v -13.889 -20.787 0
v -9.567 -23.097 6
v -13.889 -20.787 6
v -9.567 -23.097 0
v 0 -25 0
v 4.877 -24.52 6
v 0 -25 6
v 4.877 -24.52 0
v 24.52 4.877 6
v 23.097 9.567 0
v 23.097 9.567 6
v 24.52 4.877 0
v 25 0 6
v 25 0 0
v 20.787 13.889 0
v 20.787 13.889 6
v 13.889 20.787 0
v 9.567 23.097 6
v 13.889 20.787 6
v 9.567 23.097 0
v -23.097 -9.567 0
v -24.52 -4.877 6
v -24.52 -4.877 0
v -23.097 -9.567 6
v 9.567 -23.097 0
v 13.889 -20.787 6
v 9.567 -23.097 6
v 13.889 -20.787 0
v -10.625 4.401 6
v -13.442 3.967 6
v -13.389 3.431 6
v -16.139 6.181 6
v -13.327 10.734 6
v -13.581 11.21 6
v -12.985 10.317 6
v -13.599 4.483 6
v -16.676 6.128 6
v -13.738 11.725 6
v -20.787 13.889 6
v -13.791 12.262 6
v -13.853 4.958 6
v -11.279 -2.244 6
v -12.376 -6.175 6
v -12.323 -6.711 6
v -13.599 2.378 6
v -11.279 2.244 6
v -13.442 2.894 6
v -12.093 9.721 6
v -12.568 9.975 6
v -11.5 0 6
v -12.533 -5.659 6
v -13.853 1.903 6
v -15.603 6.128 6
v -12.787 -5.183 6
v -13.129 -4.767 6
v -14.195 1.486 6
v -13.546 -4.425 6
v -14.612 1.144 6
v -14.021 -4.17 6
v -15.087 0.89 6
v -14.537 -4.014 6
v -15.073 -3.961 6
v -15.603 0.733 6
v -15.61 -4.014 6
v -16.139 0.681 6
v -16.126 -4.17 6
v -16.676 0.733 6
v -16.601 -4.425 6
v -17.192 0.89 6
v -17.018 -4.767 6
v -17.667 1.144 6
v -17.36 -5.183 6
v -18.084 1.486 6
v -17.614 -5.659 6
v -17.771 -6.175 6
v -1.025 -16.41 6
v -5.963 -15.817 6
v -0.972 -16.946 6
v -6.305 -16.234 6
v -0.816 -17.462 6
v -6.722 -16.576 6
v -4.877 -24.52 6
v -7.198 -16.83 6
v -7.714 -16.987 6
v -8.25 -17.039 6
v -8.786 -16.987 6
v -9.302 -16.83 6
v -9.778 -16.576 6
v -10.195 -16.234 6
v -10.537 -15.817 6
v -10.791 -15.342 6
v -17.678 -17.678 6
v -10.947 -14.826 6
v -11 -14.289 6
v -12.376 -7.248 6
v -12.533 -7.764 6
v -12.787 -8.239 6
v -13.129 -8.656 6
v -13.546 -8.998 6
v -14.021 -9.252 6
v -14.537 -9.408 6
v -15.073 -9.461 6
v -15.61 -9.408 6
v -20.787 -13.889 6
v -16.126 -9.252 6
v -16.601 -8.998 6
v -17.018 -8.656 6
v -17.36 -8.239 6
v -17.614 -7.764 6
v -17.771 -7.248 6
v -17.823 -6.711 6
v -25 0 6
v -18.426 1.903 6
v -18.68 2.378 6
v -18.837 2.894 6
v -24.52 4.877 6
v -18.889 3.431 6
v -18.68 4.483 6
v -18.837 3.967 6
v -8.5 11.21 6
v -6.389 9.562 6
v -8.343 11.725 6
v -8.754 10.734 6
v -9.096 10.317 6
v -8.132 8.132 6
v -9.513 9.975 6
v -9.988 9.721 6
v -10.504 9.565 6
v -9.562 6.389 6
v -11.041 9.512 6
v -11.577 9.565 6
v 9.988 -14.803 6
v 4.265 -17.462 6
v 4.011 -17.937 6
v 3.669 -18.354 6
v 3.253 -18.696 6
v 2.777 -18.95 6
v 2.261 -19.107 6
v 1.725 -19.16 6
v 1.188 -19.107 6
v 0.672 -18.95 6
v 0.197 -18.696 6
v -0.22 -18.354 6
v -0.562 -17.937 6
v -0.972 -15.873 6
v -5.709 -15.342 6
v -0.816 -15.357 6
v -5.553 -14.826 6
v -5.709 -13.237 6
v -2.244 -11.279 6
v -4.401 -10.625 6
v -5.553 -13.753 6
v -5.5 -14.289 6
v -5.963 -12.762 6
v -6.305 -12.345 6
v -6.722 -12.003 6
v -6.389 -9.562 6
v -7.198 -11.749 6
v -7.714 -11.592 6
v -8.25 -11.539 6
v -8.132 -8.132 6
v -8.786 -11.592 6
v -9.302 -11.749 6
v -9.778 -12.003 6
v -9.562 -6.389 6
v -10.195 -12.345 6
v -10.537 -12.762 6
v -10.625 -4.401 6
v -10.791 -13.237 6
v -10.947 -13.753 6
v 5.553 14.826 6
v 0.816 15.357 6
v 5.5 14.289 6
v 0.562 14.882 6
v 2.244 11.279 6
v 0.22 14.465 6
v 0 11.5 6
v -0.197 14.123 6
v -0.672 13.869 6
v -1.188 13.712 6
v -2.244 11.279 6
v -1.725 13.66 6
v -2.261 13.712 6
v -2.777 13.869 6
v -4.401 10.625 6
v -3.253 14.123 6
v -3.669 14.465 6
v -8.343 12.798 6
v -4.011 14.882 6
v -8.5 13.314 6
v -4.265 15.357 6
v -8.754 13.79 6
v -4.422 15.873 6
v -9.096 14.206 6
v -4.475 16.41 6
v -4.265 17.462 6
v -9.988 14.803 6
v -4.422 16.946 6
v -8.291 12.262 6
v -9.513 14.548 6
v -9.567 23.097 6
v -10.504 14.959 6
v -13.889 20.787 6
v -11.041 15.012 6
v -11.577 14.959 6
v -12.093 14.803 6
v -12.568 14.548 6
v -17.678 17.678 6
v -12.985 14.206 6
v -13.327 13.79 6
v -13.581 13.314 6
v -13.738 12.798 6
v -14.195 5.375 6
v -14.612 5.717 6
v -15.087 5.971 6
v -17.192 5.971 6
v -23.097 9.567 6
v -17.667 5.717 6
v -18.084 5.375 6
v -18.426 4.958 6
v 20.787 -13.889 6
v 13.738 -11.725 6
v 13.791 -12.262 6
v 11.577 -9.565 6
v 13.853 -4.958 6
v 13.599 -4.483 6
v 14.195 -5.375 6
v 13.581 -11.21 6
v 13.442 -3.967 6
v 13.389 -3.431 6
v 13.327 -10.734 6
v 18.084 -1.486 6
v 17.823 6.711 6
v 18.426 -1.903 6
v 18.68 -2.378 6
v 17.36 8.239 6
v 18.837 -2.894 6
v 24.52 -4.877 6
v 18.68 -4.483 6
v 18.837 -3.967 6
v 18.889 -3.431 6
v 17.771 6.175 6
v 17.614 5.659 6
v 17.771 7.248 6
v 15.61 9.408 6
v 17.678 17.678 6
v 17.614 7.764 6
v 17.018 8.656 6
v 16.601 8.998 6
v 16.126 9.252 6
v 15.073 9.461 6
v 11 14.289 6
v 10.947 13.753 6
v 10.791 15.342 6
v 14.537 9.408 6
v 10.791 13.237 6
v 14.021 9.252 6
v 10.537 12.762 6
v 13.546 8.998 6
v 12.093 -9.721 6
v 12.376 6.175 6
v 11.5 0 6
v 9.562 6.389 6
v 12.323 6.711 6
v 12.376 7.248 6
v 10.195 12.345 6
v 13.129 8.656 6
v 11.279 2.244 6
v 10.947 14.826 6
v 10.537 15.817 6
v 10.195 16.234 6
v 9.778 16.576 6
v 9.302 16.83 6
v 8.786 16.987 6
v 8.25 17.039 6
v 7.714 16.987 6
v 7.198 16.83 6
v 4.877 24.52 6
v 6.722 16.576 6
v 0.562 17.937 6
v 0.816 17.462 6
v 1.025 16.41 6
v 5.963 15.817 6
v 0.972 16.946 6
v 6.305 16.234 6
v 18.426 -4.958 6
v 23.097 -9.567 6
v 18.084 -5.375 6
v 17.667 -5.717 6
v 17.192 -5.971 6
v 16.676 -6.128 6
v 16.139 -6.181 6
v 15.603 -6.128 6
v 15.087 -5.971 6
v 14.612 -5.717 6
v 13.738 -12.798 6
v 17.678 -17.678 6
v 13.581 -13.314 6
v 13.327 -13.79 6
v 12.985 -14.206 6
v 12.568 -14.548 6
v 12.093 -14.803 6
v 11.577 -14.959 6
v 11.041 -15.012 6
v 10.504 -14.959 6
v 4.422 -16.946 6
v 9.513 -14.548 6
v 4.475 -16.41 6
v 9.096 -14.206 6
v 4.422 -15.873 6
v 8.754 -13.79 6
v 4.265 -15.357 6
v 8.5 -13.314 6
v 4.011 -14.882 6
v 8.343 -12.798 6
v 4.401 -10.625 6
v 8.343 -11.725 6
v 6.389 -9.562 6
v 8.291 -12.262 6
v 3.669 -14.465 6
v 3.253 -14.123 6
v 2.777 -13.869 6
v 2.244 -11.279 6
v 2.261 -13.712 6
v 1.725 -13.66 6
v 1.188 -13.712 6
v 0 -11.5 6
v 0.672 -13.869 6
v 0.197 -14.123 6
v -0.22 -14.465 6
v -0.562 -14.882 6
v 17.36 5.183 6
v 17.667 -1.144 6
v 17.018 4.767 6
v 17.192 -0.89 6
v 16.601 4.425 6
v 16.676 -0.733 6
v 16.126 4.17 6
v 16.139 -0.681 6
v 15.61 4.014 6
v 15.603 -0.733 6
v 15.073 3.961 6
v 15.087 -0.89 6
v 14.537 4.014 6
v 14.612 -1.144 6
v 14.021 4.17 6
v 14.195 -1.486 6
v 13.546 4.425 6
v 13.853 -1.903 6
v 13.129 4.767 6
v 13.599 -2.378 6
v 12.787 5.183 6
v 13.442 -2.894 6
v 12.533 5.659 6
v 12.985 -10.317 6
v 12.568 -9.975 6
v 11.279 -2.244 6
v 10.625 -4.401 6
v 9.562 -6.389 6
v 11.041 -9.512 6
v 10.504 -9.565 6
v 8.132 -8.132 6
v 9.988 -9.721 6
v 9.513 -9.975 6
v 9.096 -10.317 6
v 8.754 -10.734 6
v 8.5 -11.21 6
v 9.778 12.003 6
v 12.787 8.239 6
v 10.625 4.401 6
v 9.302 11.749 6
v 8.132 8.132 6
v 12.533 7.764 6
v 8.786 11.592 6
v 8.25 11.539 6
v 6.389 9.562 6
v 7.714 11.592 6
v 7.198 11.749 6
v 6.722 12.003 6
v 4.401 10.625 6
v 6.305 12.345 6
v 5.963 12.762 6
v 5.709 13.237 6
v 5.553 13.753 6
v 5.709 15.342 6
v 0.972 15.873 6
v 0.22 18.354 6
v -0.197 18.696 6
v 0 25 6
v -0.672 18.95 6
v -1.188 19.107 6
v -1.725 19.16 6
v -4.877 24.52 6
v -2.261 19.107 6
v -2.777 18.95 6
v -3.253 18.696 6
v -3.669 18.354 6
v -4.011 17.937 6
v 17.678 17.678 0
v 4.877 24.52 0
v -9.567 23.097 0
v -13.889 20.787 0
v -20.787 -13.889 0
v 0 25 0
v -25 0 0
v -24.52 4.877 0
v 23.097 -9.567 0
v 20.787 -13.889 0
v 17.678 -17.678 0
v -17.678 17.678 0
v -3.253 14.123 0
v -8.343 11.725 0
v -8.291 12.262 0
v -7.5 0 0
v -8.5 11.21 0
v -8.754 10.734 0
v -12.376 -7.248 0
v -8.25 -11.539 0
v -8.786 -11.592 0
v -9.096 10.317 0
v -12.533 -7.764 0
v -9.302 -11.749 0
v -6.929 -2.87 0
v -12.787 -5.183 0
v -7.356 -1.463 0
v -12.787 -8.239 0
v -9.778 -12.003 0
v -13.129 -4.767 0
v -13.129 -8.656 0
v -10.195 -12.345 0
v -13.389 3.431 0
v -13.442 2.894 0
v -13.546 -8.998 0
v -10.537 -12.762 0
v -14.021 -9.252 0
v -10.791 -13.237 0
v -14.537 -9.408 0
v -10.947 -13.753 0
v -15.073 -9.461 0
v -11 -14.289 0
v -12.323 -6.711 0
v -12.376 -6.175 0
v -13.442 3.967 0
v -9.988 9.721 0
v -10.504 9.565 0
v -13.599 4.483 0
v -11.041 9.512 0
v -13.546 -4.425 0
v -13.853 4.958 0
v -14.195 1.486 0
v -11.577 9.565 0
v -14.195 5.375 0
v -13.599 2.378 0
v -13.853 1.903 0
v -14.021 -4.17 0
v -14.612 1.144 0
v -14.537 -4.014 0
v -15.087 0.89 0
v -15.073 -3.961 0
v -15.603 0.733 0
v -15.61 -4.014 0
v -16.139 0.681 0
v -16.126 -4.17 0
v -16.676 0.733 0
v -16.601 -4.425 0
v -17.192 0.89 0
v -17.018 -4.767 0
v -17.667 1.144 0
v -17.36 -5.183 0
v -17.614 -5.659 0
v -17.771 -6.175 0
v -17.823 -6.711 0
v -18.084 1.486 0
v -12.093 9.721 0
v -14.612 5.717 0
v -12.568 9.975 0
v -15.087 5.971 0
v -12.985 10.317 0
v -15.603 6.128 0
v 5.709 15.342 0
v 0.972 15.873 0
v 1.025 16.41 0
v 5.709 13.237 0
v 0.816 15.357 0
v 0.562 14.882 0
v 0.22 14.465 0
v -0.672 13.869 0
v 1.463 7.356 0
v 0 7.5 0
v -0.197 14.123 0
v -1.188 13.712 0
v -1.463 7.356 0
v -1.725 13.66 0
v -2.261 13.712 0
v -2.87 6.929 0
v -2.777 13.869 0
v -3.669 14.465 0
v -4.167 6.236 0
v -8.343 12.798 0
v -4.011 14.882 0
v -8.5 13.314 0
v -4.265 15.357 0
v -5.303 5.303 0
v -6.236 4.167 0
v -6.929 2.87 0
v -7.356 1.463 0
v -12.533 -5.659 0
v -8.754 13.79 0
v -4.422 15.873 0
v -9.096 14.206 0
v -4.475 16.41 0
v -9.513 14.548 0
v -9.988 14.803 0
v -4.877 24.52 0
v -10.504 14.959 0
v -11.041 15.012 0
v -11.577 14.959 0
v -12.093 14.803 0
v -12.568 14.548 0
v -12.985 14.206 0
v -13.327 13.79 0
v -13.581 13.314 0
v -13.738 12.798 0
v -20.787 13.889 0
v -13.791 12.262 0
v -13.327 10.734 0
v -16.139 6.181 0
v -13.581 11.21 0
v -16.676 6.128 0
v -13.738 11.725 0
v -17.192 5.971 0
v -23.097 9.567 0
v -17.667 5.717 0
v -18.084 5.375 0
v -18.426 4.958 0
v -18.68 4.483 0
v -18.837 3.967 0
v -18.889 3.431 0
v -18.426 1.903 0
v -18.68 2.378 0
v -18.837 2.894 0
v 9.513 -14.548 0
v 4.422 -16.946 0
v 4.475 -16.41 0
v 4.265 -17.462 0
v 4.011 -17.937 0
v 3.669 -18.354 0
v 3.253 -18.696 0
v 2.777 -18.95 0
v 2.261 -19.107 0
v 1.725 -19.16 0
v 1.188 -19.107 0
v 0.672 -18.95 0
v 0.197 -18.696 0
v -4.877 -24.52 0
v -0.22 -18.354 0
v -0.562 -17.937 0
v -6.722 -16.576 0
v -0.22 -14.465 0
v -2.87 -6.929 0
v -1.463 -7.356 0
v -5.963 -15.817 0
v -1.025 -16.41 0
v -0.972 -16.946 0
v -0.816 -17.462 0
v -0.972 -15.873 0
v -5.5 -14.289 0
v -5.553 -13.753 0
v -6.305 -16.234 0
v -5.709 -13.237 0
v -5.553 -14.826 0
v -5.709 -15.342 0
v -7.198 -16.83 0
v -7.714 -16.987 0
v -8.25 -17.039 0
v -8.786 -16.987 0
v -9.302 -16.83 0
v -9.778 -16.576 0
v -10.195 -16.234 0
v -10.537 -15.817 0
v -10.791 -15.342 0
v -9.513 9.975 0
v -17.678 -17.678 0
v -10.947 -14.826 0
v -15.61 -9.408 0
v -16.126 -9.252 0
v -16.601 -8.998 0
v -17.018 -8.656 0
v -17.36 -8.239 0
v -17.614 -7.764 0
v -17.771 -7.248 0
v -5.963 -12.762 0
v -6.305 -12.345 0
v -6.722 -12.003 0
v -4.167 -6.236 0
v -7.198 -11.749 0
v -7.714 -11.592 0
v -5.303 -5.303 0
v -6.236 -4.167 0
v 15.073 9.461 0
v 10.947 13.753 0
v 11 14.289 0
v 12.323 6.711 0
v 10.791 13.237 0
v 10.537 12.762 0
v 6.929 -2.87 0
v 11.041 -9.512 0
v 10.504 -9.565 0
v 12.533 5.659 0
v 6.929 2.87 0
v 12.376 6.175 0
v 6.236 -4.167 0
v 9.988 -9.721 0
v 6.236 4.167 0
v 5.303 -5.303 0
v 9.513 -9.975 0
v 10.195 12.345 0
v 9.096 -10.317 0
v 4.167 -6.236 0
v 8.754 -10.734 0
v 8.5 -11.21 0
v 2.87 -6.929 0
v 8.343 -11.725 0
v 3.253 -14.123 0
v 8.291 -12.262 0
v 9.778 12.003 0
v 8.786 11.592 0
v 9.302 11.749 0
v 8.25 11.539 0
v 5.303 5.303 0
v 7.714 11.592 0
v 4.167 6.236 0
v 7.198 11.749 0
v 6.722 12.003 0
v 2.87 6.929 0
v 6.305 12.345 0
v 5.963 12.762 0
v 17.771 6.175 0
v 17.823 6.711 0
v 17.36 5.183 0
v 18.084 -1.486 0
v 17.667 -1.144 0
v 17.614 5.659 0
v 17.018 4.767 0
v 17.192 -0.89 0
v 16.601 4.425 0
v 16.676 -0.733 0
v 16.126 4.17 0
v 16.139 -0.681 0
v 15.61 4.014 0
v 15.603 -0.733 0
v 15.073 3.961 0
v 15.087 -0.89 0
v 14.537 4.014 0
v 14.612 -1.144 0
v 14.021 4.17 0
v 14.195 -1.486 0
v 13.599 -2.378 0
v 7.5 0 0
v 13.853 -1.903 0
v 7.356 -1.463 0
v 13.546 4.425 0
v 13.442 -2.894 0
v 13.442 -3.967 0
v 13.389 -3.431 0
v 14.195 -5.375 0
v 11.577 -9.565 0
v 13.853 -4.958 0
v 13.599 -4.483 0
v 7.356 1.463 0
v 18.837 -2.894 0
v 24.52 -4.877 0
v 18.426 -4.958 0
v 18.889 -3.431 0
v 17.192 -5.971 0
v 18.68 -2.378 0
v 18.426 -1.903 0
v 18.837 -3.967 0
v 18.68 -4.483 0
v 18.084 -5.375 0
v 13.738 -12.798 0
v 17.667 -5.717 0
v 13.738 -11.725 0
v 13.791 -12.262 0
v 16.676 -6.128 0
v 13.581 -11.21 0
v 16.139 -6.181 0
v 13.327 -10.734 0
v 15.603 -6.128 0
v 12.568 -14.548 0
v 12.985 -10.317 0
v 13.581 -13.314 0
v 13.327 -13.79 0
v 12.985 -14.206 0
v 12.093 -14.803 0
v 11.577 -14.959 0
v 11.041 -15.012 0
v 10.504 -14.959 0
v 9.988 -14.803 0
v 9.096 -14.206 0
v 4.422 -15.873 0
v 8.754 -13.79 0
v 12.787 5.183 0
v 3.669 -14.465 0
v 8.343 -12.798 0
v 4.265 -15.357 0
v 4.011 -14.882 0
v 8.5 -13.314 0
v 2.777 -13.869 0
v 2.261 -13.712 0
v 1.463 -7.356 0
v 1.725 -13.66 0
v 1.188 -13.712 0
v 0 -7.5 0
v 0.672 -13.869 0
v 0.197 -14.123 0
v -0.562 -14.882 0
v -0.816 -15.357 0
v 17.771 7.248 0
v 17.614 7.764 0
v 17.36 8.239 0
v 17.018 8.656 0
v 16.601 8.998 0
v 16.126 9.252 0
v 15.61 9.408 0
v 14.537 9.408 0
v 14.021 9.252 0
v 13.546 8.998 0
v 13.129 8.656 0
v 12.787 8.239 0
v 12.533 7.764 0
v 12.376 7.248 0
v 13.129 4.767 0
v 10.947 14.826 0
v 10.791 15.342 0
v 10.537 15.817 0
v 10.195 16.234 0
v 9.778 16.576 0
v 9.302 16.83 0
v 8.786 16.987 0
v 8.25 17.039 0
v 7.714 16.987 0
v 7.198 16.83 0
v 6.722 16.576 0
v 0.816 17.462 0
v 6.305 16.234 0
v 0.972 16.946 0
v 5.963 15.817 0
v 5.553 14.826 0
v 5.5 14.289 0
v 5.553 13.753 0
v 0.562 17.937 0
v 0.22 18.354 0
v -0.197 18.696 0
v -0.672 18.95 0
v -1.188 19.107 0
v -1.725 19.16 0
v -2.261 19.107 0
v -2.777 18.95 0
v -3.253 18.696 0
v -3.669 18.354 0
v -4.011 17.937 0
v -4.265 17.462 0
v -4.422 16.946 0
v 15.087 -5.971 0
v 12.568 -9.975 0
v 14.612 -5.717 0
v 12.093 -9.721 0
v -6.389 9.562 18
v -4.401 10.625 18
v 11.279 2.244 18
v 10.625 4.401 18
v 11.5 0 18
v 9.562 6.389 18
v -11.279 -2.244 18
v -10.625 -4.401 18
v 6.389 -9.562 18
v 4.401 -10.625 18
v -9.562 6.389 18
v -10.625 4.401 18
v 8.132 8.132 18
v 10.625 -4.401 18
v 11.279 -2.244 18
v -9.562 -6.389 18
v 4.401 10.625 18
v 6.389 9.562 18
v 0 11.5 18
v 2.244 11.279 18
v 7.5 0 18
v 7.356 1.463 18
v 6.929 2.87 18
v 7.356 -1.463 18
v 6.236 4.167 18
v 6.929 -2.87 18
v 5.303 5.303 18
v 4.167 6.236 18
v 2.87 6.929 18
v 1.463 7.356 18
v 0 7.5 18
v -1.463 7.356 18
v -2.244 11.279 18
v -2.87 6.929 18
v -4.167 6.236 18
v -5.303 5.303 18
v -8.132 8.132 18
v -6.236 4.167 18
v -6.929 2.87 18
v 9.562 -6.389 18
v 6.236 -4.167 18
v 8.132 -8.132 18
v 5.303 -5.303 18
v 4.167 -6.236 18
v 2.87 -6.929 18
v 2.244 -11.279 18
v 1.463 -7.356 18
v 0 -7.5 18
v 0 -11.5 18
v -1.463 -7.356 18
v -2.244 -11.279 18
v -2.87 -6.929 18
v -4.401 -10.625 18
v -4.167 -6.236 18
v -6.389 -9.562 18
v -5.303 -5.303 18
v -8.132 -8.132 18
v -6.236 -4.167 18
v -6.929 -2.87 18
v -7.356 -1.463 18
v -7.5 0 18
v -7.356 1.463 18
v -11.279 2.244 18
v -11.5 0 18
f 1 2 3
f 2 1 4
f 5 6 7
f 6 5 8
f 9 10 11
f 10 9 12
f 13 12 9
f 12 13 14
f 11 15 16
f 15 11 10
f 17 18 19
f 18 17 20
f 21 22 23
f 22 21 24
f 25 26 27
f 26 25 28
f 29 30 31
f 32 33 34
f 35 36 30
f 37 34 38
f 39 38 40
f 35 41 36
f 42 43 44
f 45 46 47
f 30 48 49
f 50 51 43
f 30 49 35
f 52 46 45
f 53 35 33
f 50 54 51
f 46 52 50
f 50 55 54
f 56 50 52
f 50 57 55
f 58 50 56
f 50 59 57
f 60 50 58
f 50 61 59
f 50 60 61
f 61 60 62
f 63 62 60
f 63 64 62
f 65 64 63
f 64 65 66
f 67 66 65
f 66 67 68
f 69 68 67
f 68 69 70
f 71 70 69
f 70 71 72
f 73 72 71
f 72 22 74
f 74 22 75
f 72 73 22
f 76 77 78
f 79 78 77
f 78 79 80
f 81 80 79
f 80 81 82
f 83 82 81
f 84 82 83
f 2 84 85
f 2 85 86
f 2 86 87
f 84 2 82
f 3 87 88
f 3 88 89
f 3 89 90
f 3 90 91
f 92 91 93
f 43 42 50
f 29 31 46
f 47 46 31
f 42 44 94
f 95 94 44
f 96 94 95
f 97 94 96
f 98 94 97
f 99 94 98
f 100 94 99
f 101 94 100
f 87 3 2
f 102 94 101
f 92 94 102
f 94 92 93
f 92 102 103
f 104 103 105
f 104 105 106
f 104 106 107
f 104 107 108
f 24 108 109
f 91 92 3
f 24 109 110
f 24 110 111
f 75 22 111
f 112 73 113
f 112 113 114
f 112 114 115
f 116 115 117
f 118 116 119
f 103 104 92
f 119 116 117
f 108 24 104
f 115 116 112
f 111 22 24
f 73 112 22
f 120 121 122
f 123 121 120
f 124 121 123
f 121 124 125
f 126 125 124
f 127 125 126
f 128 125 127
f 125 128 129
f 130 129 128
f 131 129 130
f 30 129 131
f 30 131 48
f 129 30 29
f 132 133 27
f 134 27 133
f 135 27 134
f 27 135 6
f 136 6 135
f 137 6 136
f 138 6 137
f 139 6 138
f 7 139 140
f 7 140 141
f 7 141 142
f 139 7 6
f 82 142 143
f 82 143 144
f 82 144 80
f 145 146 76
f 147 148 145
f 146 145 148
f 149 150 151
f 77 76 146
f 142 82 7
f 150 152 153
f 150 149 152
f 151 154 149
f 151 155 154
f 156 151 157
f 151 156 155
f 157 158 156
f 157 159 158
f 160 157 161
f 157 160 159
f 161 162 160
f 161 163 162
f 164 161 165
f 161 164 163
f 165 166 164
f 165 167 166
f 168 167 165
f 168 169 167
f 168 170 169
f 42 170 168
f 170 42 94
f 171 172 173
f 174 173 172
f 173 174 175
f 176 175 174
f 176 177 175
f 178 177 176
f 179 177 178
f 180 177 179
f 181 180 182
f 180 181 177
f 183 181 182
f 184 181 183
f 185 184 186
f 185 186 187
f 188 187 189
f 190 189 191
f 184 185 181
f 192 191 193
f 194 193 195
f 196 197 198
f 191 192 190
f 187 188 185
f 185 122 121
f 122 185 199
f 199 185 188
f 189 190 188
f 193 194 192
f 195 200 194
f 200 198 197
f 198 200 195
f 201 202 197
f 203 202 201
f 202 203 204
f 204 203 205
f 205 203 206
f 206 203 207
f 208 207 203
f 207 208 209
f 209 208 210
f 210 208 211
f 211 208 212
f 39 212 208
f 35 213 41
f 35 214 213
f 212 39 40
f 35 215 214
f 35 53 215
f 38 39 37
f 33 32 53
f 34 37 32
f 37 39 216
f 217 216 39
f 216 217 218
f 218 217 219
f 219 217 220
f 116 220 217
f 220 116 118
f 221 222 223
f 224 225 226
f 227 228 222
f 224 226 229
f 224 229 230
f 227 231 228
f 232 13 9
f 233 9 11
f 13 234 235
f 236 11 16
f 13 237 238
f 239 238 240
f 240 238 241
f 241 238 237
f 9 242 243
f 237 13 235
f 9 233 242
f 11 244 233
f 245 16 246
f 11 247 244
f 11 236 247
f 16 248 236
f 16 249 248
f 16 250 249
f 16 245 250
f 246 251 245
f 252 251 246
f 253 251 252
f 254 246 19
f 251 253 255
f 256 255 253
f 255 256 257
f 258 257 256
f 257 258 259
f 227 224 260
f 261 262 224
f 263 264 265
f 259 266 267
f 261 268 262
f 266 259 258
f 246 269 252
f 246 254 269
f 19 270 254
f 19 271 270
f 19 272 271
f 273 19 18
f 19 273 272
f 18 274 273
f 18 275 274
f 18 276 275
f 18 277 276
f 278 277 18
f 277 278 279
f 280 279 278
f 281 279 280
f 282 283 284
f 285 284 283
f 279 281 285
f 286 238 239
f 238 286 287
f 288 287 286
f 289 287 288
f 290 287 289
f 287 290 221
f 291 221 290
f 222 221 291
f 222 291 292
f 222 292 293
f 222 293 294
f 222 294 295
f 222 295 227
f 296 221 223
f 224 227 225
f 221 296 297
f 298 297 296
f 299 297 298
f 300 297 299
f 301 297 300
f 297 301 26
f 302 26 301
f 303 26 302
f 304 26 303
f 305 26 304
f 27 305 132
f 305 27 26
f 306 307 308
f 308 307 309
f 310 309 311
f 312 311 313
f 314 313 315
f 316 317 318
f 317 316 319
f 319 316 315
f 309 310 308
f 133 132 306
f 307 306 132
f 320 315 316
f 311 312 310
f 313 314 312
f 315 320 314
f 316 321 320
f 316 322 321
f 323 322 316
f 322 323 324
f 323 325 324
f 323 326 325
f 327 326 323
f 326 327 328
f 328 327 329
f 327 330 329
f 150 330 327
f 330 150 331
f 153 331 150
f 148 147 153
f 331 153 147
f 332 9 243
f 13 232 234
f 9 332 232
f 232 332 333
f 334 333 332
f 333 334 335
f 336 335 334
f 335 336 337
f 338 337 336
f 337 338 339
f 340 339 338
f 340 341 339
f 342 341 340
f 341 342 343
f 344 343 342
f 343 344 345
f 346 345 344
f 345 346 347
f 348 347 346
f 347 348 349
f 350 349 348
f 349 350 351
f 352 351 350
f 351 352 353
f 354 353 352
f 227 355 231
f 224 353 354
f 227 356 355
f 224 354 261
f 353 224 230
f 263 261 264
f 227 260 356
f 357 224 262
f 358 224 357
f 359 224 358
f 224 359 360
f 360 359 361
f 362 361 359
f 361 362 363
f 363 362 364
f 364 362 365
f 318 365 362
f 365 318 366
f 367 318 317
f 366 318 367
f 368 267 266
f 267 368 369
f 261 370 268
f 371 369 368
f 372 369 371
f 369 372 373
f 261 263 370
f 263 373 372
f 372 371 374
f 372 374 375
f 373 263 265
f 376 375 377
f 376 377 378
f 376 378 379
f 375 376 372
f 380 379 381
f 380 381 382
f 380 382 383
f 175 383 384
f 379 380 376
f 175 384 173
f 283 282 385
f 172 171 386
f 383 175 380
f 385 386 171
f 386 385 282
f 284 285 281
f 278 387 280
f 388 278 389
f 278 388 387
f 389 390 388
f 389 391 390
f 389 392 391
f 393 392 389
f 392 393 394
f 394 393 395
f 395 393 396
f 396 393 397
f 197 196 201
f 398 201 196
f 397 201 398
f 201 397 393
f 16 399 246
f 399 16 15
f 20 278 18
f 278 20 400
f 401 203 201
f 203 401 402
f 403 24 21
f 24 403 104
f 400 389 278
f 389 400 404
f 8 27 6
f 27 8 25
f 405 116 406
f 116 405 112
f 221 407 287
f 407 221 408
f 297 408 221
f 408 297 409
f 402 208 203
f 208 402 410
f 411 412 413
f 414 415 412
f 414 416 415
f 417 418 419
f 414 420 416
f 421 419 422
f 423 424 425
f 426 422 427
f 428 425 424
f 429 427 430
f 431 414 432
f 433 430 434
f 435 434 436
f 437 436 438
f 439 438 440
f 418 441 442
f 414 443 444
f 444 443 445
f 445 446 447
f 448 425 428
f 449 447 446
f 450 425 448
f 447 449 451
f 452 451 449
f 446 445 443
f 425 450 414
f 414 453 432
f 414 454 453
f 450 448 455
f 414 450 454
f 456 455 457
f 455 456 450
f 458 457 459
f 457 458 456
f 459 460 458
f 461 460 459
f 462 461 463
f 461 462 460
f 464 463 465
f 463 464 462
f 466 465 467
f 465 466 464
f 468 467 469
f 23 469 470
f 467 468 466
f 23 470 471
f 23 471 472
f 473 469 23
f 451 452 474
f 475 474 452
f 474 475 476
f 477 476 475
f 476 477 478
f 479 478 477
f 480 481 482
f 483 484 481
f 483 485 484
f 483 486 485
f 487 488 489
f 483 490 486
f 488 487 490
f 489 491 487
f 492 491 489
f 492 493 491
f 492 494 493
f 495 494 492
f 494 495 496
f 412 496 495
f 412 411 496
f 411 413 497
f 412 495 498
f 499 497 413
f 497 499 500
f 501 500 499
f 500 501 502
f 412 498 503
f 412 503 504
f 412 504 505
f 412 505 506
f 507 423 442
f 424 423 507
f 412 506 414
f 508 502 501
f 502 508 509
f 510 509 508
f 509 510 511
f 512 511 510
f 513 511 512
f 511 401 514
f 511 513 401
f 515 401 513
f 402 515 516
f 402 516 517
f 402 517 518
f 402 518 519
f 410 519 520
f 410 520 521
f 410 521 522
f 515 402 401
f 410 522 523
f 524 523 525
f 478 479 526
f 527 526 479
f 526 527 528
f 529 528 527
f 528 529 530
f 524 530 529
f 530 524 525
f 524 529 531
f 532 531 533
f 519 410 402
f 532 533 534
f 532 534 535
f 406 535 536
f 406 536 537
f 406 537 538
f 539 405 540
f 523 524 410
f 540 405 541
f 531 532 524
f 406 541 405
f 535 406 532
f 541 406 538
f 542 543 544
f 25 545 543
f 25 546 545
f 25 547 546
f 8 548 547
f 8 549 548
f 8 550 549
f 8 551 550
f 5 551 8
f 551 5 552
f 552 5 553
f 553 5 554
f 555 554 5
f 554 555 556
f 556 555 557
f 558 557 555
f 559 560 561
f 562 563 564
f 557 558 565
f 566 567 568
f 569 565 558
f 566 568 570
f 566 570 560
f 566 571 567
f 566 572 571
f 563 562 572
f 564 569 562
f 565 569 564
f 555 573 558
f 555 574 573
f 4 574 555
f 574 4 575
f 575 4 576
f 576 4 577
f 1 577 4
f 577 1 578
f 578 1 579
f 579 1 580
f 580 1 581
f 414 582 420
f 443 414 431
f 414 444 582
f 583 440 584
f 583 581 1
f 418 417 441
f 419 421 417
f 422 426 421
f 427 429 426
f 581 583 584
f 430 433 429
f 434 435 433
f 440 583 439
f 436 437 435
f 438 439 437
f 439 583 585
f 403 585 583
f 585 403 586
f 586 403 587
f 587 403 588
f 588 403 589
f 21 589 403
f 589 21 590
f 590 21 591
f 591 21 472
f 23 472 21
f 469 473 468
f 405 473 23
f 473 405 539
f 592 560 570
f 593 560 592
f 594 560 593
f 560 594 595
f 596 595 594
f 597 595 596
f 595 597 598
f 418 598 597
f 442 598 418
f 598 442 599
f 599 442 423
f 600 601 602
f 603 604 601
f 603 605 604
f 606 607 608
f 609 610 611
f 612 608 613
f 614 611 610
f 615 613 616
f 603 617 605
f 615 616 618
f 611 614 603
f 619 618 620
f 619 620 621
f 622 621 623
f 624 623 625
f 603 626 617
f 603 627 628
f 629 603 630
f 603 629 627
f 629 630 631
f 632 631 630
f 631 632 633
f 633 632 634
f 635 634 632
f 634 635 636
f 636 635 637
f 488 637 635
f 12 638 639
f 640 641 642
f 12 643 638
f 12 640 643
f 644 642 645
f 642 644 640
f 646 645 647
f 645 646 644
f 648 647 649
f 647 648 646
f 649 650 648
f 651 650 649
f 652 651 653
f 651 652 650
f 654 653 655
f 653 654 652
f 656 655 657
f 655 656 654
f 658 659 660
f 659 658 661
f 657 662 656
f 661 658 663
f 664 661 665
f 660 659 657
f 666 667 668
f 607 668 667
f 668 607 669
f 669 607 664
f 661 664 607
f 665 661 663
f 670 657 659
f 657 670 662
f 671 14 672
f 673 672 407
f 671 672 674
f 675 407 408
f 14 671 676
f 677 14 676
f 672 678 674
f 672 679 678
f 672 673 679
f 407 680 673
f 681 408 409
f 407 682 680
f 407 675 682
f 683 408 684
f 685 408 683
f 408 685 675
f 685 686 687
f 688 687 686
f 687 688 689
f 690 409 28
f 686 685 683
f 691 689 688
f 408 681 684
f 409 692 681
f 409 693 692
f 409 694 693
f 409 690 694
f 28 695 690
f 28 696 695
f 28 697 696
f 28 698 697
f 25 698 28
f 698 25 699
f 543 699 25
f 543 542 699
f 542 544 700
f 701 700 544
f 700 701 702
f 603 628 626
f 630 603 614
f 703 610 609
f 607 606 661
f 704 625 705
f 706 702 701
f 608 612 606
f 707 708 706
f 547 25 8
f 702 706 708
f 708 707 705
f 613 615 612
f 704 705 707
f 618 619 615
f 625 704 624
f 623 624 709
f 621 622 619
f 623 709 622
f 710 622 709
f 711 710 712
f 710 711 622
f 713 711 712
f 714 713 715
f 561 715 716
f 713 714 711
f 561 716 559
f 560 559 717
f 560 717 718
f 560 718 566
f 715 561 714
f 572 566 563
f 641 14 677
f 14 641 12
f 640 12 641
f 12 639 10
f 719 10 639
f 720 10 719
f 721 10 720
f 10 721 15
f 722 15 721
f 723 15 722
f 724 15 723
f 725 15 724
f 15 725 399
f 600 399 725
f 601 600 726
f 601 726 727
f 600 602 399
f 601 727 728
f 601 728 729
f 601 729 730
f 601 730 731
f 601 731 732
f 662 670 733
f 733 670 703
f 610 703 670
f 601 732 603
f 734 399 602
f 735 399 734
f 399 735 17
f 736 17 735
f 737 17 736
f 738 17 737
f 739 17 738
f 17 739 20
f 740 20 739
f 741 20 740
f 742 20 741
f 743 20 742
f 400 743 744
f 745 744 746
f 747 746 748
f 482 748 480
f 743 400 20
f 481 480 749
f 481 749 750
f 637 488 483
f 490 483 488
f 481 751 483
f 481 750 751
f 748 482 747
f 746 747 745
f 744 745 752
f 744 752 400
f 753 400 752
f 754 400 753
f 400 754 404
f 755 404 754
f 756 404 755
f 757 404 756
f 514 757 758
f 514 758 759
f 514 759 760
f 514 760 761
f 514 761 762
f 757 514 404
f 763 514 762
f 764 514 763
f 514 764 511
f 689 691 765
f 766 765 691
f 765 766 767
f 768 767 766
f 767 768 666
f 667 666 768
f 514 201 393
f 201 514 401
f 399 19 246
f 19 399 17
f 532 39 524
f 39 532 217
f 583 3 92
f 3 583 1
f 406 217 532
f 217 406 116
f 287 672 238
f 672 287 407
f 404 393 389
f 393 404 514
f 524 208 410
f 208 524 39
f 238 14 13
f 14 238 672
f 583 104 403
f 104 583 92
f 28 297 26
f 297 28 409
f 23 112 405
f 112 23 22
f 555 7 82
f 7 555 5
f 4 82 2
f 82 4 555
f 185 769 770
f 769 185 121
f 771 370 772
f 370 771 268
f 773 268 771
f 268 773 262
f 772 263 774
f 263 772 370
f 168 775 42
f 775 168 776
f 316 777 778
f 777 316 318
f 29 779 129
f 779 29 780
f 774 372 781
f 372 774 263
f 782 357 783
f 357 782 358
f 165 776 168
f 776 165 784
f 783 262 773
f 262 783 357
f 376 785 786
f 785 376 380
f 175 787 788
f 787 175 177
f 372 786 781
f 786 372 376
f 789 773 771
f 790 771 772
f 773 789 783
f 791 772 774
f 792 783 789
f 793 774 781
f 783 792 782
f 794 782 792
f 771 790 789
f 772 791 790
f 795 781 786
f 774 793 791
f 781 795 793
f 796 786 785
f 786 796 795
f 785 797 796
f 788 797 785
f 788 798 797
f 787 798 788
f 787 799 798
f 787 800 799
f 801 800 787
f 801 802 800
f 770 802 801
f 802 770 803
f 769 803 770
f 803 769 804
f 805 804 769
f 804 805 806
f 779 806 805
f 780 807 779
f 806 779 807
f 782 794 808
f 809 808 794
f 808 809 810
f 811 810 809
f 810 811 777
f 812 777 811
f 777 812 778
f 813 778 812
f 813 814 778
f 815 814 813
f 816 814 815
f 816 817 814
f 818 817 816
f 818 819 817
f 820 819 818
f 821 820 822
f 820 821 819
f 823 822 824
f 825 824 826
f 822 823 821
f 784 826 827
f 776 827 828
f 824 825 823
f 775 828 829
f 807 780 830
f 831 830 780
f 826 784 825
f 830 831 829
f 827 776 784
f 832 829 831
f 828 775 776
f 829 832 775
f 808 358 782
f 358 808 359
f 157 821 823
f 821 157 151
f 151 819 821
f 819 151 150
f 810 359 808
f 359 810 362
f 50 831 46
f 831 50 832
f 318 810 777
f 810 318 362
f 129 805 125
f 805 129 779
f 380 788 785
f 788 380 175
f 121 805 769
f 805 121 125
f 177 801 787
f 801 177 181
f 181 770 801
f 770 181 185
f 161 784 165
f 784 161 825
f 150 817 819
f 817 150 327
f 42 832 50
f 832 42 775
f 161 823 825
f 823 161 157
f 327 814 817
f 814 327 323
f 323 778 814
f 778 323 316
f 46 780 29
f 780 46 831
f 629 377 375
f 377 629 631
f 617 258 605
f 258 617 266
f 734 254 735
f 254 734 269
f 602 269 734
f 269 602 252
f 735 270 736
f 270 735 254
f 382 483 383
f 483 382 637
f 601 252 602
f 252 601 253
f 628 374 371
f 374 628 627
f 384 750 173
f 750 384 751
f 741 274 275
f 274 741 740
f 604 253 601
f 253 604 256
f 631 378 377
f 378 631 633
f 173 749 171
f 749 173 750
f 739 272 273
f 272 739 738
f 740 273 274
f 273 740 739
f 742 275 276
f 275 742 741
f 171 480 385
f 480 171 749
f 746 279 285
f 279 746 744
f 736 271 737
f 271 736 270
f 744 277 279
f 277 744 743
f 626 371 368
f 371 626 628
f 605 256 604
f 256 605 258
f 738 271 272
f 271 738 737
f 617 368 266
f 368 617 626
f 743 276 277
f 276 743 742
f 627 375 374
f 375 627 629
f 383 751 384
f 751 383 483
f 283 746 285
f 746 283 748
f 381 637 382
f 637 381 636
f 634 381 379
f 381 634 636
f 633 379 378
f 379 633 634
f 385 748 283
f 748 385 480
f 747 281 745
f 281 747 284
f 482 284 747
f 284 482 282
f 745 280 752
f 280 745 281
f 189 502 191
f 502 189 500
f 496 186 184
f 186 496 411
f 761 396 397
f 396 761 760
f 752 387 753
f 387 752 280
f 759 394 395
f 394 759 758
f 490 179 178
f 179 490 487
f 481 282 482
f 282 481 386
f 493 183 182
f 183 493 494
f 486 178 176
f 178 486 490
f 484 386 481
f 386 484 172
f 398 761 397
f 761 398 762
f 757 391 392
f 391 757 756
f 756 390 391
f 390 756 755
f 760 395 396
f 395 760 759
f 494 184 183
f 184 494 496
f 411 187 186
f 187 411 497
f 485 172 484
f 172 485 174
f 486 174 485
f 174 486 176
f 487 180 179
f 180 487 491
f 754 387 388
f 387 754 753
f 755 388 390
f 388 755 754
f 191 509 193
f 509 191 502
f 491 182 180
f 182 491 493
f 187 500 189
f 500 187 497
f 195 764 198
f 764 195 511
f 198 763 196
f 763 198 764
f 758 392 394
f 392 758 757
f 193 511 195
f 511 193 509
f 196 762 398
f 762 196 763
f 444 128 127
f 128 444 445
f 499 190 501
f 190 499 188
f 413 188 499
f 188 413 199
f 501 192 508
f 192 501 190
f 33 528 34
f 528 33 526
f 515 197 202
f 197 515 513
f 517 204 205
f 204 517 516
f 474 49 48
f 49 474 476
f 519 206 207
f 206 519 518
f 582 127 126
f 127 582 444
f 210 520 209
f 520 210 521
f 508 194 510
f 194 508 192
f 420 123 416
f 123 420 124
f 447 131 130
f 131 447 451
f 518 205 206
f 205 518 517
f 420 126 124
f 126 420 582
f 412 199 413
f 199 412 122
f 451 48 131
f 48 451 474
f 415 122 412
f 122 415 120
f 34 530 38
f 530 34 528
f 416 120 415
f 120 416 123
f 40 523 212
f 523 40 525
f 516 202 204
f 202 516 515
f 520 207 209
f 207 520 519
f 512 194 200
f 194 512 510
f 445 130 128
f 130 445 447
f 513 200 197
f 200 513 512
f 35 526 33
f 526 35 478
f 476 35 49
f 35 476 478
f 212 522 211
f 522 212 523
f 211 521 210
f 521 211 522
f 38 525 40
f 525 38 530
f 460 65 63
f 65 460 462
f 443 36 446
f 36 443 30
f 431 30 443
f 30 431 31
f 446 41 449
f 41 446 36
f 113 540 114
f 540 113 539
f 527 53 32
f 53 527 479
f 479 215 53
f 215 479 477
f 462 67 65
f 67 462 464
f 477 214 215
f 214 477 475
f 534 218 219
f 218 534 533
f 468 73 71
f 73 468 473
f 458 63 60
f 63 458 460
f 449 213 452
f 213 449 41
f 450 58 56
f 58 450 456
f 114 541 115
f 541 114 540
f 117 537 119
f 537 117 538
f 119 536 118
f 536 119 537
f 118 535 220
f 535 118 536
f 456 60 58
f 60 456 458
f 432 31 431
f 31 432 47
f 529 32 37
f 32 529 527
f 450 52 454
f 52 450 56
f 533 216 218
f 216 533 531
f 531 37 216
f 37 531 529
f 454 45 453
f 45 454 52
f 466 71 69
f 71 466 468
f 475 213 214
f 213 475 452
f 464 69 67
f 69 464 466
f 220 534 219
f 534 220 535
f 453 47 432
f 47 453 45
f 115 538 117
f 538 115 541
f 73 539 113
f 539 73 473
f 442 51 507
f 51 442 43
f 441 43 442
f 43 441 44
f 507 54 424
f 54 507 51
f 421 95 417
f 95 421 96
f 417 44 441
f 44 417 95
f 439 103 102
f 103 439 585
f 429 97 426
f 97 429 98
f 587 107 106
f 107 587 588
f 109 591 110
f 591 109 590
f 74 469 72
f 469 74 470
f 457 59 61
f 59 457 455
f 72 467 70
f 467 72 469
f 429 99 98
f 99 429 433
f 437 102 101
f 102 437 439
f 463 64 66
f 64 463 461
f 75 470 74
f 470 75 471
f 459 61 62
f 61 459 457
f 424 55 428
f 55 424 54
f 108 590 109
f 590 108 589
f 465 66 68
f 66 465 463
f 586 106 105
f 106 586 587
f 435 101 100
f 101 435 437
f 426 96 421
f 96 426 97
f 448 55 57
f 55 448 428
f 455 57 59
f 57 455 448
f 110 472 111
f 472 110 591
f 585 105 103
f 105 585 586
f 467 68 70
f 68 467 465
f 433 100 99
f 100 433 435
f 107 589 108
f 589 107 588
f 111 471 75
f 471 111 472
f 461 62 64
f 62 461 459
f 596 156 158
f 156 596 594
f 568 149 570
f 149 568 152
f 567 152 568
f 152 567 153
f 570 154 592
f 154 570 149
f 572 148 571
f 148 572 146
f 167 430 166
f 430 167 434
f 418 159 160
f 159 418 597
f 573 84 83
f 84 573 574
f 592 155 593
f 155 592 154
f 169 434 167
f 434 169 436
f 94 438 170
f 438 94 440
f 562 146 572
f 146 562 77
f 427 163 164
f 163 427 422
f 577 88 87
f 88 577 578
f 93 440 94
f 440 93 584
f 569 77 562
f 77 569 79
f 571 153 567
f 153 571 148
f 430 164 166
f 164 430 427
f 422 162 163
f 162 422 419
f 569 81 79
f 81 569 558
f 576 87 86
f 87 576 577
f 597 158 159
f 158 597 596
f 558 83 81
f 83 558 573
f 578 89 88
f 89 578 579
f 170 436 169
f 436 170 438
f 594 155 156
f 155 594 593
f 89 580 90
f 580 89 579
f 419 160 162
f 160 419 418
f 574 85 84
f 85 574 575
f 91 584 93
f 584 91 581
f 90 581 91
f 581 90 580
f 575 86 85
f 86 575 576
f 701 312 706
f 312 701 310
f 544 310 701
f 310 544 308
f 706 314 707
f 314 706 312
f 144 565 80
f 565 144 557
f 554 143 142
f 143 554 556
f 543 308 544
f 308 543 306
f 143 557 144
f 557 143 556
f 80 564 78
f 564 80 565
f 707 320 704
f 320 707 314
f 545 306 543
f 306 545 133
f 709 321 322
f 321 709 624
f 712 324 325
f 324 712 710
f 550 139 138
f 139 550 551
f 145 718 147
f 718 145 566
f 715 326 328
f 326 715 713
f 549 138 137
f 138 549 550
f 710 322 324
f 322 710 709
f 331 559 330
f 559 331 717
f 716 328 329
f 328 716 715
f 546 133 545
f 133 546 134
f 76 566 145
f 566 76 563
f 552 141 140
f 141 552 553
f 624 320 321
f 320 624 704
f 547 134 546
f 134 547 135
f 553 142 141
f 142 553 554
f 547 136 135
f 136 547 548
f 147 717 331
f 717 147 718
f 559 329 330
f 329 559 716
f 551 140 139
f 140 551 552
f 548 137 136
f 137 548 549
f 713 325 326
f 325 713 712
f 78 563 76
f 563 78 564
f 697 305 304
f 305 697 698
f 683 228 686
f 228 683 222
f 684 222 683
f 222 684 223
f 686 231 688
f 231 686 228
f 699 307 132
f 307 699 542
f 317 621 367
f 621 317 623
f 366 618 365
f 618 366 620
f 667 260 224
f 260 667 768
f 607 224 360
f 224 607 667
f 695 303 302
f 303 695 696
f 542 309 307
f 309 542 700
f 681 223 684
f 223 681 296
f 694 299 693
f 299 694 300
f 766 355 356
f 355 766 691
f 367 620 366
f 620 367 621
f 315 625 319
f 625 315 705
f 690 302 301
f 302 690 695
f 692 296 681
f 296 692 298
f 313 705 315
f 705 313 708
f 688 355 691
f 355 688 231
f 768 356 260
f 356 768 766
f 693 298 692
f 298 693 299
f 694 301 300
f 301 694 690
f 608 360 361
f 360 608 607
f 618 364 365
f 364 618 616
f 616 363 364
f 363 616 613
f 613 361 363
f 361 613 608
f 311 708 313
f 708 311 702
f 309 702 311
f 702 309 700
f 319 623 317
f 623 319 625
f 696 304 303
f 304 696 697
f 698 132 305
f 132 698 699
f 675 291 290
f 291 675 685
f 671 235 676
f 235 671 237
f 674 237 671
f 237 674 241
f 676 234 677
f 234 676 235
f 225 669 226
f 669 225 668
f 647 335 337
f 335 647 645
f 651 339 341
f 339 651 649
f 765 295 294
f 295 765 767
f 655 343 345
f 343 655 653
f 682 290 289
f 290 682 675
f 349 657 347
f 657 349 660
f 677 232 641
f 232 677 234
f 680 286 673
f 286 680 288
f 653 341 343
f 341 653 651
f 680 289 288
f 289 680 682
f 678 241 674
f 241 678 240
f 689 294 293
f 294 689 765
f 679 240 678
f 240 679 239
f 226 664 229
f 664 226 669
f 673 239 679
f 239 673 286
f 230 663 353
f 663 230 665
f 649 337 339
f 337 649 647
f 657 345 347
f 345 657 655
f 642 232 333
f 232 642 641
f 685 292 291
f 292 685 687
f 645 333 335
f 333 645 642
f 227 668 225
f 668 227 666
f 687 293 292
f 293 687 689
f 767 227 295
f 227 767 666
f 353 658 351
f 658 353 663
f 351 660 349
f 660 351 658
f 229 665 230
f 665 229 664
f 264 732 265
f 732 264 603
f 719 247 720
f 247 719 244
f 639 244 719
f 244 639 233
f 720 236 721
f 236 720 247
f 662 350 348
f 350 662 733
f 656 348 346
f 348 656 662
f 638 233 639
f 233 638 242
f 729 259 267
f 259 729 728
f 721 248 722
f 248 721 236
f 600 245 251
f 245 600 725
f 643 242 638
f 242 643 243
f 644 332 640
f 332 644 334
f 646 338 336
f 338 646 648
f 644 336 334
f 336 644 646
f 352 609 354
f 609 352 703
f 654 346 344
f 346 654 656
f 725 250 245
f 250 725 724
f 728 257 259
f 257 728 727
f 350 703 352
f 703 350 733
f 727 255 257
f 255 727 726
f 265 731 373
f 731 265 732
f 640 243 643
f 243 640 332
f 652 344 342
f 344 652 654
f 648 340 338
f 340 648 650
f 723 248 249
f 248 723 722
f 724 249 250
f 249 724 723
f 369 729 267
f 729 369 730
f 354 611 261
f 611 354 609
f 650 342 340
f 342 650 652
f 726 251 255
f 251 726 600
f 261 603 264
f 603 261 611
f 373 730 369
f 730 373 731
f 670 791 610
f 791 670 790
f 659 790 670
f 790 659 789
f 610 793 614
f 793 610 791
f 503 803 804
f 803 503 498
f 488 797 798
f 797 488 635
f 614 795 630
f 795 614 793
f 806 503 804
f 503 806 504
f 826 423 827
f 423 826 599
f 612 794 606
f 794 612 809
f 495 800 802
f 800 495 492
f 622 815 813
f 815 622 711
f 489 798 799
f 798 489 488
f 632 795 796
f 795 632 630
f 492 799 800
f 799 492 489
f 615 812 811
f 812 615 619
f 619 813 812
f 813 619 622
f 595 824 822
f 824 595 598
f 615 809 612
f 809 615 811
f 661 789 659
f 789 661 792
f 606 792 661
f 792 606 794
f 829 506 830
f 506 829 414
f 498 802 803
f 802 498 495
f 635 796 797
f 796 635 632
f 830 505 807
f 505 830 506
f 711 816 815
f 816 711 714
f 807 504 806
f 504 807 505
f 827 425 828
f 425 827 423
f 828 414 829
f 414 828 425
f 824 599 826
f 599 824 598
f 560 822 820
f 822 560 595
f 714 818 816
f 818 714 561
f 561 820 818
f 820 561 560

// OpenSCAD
$fn = 32;

// ----------------------------------------------------------------------
// Flange Ø50 x 6
// 10 holes on a Ø33 bolt circle, bolted joints
// ----------------------------------------------------------------------

// --- parameters (mm) ---
flange_d = 50;   // outside diameter of the flange
thickness = 6;   // flange thickness
holes = 10;      // number of bolt holes
pcd = 33;        // bolt circle diameter
start_deg = 60;  // angle of the first hole, from +X
hole_d = 5.5;    // bolt hole diameter
bore_d = 15;     // central through bore
hub_d = 23;      // hub outside diameter
hub_h = 12;      // hub height above the flange face (0 = no hub)

// --- derived feature positions (mm) ---
height = thickness + hub_h;  // = 18   overall height of the part
pcd_r = pcd / 2;             // = 16.5   bolt circle radius
hole_step = 360 / holes;     // = 36   angular pitch
feature_centers = [
  [pcd_r * cos(start_deg + 0 * hole_step), pcd_r * sin(start_deg + 0 * hole_step)],
  [pcd_r * cos(start_deg + 1 * hole_step), pcd_r * sin(start_deg + 1 * hole_step)],
  [pcd_r * cos(start_deg + 2 * hole_step), pcd_r * sin(start_deg + 2 * hole_step)],
  [pcd_r * cos(start_deg + 3 * hole_step), pcd_r * sin(start_deg + 3 * hole_step)],
  [pcd_r * cos(start_deg + 4 * hole_step), pcd_r * sin(start_deg + 4 * hole_step)],
  [pcd_r * cos(start_deg + 5 * hole_step), pcd_r * sin(start_deg + 5 * hole_step)],
  [pcd_r * cos(start_deg + 6 * hole_step), pcd_r * sin(start_deg + 6 * hole_step)],
  [pcd_r * cos(start_deg + 7 * hole_step), pcd_r * sin(start_deg + 7 * hole_step)],
  [pcd_r * cos(start_deg + 8 * hole_step), pcd_r * sin(start_deg + 8 * hole_step)],
  [pcd_r * cos(start_deg + 9 * hole_step), pcd_r * sin(start_deg + 9 * hole_step)]
];   // bolt hole centres on the pitch circle

// flange disc, every hole and the bore cut straight through
difference() {
  union() {
    cylinder(d = flange_d, h = thickness);
    cylinder(d = hub_d, h = height);  // hub, overlapped into the flange
  }
  translate([0, 0, -1]) cylinder(d = bore_d, h = height + 2);  // bore, through
  for (centre = feature_centers)
    translate([centre[0], centre[1], -1]) cylinder(d = hole_d, h = thickness + 2);
}
